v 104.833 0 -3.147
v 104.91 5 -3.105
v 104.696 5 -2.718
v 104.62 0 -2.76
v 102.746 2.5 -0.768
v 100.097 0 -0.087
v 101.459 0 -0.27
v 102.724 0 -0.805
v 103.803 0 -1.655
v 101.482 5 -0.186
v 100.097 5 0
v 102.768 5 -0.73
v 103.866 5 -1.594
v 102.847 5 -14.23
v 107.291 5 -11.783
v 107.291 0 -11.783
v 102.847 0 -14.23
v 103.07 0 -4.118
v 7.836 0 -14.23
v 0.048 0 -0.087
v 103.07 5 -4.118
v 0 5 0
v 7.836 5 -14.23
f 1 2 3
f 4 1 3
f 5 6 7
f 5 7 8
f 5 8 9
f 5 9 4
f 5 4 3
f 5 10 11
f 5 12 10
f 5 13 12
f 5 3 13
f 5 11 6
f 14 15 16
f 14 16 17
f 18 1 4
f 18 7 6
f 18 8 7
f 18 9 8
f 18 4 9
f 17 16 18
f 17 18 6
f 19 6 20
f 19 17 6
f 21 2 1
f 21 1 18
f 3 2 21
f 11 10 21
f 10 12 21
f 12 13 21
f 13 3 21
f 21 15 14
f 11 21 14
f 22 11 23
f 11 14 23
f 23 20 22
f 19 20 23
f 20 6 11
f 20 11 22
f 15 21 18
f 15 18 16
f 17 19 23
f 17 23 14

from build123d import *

# Parameters (mm, degrees)
BOSS_EXTRUDE1_DEPTH = 5
CUT_EXTRUDE1_REACH  = 114.056
CUT_EXTRUDE2_REACH  = 111.68
FILLET1_R           = 5.25
DRAFT1_ANGLE        = -1


with BuildPart() as part:
    # Sketch1 → Boss-Extrude1 (new body)
    with BuildSketch(Plane(origin=(0, 0, 0), x_dir=(1, 0, 0), z_dir=(0, 1, 0))):
        Polygon((0, 0), (7.835950564, 14.23), (111.035815461, 14.23), (103.199864898, 0), align=None)
    extrude(amount=BOSS_EXTRUDE1_DEPTH)

    # Sketch2 → Cut-Extrude1 (cut, up to next)
    with BuildSketch(Plane(origin=(0, 5, 0), x_dir=(1, 0, 0), z_dir=(0, 1, 0)), mode=Mode.PRIVATE) as cut_extrude1_sk1:
        Polygon((104.909775718, 3.105179235), (103.070238426, 4.118146436), (108.638473467, 14.23), (111.035815461, 14.23), align=None)
    cut_extrude1_tool1 = extrude(cut_extrude1_sk1.sketch, amount=-CUT_EXTRUDE1_REACH, mode=Mode.PRIVATE) & part.part
    add(cut_extrude1_tool1.solids().sort_by_distance((106.930417, 5, -8.916805))[0], mode=Mode.SUBTRACT)

    # Sketch4 → Cut-Extrude2 (cut, up to next)
    with BuildSketch(Plane(origin=(0, 5, 0), x_dir=(1, 0, 0), z_dir=(0, 1, 0)), mode=Mode.PRIVATE) as cut_extrude2_sk1:
        Polygon((108.638473467, 14.23), (107.2909351, 11.782885153), (102.847001464, 14.23), align=None)
    cut_extrude2_tool1 = extrude(cut_extrude2_sk1.sketch, amount=-CUT_EXTRUDE2_REACH, mode=Mode.PRIVATE) & part.part
    add(cut_extrude2_tool1.solids().sort_by_distance((106.258803, 5, -13.414295))[0], mode=Mode.SUBTRACT)

    # Fillet1
    fillet1_edges = [part.edges().sort_by_distance(p)[0] for p in [
        (103.199864898, 2.5, 0),
    ]]
    fillet(fillet1_edges, radius=FILLET1_R)

    # Draft1
    draft1_faces = [part.faces().sort_by_distance(p)[0] for p in [
        (50.048748296, 2.5, 0),
        (104.80305777, 2.5, -2.911380615),
        (102.76838647, 2.5, -0.730171766),
    ]]
    draft(draft1_faces, Plane.ZX.offset(5), DRAFT1_ANGLE)


solid = part.part
